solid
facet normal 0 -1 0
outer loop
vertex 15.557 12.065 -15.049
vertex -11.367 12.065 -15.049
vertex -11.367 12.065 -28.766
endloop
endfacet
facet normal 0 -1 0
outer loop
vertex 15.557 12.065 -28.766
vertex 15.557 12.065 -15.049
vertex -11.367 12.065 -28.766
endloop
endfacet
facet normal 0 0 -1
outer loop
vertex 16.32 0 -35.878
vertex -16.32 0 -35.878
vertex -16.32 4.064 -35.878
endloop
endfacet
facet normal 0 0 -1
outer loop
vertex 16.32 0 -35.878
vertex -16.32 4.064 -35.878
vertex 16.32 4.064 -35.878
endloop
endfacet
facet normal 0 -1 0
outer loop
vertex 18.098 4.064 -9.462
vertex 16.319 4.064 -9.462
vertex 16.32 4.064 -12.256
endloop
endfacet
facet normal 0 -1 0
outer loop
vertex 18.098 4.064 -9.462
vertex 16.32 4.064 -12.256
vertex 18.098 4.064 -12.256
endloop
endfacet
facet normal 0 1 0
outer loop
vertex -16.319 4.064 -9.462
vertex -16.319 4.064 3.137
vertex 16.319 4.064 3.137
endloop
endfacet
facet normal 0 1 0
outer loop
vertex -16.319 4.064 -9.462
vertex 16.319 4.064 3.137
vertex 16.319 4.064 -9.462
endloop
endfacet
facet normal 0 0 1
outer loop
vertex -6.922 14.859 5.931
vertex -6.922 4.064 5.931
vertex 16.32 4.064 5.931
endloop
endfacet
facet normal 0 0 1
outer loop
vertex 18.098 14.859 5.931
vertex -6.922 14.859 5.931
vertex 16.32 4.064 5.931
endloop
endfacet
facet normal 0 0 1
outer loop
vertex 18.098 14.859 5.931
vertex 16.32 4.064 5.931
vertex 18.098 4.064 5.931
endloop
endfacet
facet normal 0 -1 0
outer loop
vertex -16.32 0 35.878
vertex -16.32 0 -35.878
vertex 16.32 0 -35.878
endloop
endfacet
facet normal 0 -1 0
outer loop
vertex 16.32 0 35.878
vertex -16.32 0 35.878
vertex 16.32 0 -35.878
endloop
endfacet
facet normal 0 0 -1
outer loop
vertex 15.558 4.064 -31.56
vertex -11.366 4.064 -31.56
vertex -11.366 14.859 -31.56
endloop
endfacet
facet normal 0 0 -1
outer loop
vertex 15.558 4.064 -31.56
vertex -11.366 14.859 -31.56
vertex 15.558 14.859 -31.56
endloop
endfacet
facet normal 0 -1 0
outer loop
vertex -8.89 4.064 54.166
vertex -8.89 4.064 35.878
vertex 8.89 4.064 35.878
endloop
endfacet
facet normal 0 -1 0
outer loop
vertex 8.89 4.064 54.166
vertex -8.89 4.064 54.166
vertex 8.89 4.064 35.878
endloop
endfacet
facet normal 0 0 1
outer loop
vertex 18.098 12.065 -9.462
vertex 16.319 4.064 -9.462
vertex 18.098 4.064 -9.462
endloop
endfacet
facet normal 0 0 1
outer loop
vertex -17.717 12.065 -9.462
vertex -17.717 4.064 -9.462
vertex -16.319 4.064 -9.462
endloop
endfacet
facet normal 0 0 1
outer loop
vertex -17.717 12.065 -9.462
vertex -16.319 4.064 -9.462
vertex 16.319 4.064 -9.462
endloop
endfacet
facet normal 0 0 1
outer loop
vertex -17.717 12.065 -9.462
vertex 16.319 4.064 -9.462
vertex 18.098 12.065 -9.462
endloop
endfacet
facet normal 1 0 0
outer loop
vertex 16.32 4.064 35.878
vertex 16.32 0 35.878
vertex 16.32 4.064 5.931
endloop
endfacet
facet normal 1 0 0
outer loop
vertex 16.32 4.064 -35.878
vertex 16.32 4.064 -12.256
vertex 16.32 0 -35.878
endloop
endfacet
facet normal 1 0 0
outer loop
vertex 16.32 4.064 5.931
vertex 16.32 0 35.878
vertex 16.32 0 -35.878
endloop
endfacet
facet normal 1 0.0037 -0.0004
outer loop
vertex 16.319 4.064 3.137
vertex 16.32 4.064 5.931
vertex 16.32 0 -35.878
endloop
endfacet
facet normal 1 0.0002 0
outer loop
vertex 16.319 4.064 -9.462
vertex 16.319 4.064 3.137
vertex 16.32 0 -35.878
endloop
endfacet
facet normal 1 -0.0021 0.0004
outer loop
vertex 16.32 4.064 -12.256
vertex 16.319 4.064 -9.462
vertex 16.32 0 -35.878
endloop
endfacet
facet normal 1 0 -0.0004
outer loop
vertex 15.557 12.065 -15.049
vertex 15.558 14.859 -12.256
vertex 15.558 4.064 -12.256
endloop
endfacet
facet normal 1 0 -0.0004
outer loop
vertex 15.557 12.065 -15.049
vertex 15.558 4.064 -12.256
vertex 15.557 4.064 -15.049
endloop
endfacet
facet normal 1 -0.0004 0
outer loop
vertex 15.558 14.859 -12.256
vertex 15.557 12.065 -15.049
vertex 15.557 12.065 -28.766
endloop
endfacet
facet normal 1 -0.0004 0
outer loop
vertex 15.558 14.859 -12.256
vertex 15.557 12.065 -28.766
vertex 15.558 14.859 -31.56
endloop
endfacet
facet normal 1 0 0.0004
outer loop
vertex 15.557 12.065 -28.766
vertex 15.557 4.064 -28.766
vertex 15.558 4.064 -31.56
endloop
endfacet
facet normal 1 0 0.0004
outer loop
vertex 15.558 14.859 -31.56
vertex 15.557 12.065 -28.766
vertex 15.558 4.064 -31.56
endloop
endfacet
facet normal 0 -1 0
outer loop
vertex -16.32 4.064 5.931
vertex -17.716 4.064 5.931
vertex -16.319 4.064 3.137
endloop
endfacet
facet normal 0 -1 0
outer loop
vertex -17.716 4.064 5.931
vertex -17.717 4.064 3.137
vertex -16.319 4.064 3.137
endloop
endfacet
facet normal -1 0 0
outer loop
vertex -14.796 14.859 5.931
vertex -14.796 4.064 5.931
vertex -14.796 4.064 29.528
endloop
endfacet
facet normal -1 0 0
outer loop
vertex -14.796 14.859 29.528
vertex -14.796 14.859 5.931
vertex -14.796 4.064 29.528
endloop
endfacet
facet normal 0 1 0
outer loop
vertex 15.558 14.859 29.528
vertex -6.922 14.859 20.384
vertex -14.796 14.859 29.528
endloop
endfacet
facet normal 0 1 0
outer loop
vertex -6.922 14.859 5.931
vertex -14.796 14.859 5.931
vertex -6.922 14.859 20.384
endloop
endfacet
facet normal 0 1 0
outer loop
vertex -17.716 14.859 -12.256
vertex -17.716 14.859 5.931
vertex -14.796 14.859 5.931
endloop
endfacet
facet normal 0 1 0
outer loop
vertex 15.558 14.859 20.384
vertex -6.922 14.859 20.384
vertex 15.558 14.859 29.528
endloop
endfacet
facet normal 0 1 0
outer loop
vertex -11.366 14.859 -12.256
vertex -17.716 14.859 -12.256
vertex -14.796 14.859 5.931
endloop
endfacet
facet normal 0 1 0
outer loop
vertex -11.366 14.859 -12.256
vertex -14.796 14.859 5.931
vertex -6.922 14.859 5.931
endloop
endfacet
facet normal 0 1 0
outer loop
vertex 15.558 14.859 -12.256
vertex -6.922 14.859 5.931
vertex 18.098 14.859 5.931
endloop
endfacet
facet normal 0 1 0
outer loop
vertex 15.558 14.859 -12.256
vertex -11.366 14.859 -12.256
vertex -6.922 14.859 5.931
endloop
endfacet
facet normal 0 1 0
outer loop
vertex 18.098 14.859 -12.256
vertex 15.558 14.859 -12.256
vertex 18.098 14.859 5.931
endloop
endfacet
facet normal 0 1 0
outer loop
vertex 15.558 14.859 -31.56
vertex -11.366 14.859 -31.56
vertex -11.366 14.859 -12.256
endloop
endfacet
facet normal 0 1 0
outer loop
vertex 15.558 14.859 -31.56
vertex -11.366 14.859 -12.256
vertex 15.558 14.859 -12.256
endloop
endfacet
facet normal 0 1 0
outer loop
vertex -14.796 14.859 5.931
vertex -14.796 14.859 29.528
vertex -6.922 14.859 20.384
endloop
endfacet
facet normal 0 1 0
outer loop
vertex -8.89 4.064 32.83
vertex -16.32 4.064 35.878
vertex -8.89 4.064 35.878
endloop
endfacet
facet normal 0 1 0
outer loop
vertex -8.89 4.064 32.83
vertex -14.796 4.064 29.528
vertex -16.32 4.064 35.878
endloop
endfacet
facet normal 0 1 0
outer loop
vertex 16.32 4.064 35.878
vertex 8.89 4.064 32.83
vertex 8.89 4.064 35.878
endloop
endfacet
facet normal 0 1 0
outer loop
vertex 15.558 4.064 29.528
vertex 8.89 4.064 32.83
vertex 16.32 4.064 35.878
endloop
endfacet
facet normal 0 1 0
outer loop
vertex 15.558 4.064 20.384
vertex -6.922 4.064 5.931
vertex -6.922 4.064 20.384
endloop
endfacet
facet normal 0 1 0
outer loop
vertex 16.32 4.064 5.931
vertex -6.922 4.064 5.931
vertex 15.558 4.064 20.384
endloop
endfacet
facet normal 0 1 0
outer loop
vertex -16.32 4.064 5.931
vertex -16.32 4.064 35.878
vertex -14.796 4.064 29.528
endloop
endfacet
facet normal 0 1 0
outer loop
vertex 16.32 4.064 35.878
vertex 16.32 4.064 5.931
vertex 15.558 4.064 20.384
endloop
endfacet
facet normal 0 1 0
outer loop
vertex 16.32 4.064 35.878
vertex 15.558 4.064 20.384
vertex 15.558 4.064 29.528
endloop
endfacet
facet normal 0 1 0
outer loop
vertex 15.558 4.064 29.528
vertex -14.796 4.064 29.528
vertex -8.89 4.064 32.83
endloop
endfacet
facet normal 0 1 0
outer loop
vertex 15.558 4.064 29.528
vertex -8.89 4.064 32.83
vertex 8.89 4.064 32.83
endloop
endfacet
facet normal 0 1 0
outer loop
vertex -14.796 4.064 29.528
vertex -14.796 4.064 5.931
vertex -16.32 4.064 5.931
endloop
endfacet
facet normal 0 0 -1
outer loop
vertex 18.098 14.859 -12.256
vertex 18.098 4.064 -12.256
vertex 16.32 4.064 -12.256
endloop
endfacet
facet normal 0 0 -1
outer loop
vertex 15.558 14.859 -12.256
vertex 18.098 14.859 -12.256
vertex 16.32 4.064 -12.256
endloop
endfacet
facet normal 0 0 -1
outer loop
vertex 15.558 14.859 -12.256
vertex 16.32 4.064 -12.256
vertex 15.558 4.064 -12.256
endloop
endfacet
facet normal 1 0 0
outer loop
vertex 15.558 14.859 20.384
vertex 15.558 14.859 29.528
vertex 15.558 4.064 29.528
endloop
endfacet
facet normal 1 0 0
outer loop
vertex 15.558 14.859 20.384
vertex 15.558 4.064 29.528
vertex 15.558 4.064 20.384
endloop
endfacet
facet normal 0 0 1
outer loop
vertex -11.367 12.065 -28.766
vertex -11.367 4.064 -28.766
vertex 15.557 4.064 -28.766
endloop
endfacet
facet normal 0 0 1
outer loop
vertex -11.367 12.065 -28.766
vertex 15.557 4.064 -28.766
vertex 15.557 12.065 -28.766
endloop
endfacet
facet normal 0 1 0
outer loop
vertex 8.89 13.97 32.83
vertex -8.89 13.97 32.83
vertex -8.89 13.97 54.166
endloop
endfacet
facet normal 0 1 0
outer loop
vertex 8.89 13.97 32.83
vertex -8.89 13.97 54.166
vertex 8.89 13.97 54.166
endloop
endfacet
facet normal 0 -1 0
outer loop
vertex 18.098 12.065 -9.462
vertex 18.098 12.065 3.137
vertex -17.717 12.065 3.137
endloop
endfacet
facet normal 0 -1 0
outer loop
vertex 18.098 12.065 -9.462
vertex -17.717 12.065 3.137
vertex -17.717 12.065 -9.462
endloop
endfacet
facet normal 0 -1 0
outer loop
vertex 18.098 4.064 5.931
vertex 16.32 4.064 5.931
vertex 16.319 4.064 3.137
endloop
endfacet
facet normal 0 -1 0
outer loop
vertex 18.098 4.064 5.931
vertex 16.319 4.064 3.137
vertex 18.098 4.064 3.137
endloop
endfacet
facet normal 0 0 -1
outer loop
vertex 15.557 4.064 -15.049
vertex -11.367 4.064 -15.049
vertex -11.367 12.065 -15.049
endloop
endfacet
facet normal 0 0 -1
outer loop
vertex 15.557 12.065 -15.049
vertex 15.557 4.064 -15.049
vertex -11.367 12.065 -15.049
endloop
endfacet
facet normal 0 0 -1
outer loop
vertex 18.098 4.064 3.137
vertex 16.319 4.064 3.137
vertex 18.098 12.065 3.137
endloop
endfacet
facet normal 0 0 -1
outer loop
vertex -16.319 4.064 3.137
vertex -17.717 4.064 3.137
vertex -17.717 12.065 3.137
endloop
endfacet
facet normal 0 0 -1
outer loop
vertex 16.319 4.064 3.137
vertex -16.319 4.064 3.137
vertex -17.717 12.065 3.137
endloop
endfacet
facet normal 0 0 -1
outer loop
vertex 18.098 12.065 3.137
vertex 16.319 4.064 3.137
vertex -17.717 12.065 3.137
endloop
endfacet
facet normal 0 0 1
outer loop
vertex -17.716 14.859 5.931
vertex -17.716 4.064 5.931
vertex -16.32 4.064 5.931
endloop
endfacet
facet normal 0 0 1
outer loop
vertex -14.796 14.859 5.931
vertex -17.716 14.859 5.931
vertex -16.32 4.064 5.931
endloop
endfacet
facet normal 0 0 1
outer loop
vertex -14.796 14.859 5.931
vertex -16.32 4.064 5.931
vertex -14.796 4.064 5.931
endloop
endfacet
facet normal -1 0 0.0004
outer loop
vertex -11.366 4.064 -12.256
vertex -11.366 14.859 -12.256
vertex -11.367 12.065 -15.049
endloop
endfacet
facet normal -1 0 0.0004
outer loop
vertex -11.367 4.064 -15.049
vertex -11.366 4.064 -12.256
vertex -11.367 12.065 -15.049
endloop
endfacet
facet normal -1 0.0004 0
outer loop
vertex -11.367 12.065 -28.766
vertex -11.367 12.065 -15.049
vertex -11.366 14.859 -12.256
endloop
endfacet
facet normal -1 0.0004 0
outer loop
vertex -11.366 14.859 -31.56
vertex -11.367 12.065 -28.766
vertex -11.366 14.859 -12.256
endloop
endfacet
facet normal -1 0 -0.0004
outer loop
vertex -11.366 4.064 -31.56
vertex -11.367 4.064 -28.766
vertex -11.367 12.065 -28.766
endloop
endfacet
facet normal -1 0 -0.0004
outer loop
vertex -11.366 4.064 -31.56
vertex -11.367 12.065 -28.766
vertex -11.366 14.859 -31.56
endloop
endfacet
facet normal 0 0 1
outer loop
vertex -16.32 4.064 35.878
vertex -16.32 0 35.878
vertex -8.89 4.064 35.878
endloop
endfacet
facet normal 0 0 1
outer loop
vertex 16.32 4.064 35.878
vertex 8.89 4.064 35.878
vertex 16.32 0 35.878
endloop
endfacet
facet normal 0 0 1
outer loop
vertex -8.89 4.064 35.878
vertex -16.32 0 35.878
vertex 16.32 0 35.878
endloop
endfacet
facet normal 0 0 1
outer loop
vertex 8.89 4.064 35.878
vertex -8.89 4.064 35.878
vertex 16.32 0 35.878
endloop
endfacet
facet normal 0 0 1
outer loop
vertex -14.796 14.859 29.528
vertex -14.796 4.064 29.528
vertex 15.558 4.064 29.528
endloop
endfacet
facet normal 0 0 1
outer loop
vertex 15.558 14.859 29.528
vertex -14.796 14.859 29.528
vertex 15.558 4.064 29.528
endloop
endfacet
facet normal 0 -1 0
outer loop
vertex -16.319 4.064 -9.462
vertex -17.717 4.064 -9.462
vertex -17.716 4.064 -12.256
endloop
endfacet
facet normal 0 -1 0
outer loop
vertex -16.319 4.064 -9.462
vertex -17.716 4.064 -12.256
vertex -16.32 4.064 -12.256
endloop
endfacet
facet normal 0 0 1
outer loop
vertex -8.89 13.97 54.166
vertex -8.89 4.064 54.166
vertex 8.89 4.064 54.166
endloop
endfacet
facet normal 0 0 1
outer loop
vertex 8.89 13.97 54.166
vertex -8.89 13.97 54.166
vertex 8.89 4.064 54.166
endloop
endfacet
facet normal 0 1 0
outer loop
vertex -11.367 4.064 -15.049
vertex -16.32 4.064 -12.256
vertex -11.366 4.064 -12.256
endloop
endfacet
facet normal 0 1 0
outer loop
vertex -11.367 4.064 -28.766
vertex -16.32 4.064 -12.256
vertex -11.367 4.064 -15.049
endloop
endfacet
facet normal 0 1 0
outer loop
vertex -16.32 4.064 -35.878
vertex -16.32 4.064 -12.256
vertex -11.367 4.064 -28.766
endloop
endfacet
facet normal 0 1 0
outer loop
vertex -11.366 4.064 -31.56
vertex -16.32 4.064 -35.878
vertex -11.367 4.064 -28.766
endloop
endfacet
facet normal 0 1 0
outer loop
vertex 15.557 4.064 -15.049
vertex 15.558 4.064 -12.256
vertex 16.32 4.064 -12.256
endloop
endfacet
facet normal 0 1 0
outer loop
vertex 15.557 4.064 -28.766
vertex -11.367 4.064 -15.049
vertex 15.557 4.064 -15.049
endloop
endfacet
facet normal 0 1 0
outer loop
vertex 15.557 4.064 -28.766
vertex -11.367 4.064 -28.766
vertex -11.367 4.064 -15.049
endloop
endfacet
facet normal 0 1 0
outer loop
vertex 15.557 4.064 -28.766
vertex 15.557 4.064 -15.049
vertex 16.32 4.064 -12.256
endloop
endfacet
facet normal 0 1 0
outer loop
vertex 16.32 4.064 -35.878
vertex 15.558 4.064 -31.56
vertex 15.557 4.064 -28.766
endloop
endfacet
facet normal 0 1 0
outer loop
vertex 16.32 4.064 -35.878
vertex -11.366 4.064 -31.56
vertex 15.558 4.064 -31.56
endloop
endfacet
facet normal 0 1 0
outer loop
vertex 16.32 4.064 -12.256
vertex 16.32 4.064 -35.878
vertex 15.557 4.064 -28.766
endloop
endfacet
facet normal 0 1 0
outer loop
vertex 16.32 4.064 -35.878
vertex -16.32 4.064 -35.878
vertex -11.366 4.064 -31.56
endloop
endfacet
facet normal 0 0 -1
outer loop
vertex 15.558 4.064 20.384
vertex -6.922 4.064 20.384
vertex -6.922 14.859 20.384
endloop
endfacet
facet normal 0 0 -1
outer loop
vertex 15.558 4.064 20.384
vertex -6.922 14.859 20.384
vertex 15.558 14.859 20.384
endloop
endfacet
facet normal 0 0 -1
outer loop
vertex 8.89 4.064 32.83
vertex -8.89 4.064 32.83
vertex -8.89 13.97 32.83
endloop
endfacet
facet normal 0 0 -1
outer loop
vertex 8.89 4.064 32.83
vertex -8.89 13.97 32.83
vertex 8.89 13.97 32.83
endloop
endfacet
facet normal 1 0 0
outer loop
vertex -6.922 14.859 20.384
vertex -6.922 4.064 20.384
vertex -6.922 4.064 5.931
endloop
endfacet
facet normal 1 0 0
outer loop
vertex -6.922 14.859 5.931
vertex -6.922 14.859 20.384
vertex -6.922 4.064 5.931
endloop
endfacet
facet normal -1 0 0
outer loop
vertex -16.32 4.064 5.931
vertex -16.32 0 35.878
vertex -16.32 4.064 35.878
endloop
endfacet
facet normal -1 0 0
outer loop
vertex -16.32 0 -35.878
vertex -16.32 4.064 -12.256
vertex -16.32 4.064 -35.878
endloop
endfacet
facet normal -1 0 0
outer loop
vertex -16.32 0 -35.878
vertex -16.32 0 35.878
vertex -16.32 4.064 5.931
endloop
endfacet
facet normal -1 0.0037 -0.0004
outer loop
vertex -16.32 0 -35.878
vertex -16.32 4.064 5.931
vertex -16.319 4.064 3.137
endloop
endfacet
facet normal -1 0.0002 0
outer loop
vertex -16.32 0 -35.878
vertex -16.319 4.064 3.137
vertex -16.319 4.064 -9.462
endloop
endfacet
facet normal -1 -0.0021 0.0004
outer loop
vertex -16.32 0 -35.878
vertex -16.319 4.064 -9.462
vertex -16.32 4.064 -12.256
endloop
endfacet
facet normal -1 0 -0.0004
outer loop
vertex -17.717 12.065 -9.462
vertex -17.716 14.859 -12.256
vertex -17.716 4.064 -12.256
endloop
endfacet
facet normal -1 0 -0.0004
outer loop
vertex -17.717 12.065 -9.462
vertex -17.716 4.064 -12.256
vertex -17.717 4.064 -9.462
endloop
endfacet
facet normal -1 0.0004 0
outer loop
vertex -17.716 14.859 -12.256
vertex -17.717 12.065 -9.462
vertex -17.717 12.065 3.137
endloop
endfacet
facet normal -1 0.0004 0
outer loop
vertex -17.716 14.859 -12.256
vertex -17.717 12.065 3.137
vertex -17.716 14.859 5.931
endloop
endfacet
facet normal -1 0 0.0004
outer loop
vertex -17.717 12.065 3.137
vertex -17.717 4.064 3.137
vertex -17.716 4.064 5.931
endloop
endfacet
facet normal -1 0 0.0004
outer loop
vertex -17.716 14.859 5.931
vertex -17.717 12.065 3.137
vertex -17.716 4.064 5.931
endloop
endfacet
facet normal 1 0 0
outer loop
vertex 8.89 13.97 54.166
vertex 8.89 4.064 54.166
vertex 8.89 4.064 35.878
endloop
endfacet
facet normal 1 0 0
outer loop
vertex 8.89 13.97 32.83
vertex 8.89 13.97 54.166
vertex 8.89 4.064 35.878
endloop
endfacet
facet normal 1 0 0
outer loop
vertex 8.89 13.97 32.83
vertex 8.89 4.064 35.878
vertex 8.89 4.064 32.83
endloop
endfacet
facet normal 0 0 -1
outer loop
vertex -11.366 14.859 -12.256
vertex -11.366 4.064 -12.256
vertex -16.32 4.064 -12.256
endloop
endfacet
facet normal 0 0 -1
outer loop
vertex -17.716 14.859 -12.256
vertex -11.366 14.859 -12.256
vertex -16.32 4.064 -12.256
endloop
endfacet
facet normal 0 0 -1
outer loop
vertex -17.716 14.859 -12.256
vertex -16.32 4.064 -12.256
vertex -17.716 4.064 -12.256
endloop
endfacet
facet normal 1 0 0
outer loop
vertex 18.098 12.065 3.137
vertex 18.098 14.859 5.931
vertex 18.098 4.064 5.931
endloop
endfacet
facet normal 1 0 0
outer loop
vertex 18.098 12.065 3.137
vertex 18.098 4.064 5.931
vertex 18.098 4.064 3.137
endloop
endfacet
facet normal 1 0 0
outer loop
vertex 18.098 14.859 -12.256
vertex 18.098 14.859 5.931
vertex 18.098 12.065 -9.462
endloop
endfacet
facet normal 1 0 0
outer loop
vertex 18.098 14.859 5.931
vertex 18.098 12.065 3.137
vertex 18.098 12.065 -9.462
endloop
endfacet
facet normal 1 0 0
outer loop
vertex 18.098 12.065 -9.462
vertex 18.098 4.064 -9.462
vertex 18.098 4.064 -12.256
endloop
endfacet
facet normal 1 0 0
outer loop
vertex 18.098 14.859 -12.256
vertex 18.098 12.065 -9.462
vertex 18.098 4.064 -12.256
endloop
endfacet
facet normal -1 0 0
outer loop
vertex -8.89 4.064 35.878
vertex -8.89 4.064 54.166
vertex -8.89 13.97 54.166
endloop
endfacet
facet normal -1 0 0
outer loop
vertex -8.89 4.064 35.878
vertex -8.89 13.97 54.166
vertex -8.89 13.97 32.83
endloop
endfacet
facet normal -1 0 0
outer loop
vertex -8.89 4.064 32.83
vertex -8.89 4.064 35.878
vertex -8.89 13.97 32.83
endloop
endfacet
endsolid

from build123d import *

# Parameters (mm, degrees)
SKETCH1_W               = 32.639
SKETCH1_H               = 71.755
BOSS_EXTRUDE1_DEPTH     = 4.064
BOSS_EXTRUDE2_DEPTH     = 10.795
SKETCH3_W               = 17.78
SKETCH3_H               = 21.336
BOSS_EXTRUDE3_DEPTH     = 9.906
CUT_EXTRUDE1_DEPTH      = 66.282848799
CUT_EXTRUDE1_DEPTH_BACK = 66.282848799
SKETCH4_W               = 13.716
SKETCH4_H               = 8.001
SKETCH4_W_2             = 12.5984


with BuildPart() as part:
    # Sketch1 → Boss-Extrude1 (new body)
    with BuildSketch(Plane(origin=(0, 0, 0), x_dir=(1, 0, 0), z_dir=(0, 1, 0))):
        Rectangle(SKETCH1_W, SKETCH1_H)
    extrude(amount=BOSS_EXTRUDE1_DEPTH)

    # Sketch2 → Boss-Extrude2 (add)
    with BuildSketch(Plane(origin=(0, 4.064, 0), x_dir=(1, 0, 0), z_dir=(0, 1, 0))):
        Polygon((15.5575, 31.5595), (-11.3665, 31.5595), (-11.3665, 12.2555), (-17.7165, 12.2555), (-17.7165, -5.9309), (-14.7955, -5.9309), (-14.7955, -29.5275), (15.5575, -29.5275), (15.5575, -20.3835), (-6.9215, -20.3835), (-6.9215, -5.9309), (18.0975, -5.9309), (18.0975, 12.2555), (15.5575, 12.2555), align=None)
    extrude(amount=BOSS_EXTRUDE2_DEPTH)

    # Sketch3 → Boss-Extrude3 (add)
    with BuildSketch(Plane(origin=(0, 4.064, 0), x_dir=(1, 0, 0), z_dir=(0, 1, 0))):
        with Locations((0, -43.4975)):
            Rectangle(SKETCH3_W, SKETCH3_H)
    extrude(amount=BOSS_EXTRUDE3_DEPTH)

    # Sketch4 → Cut-Extrude1 (cut, two sides: drawn at the far end of the back side and taken through both)
    with BuildSketch(Plane(origin=(15.5575, 0, 0), x_dir=(0, 0, -1), z_dir=(1, 0, 0)).offset(-CUT_EXTRUDE1_DEPTH_BACK)):
        with Locations((21.9075, 8.0645)):
            Rectangle(SKETCH4_W, SKETCH4_H)
        with Locations((3.1623, 8.0645)):
            Rectangle(SKETCH4_W_2, SKETCH4_H)
    extrude(amount=CUT_EXTRUDE1_DEPTH + CUT_EXTRUDE1_DEPTH_BACK, mode=Mode.SUBTRACT)


solid = part.part
